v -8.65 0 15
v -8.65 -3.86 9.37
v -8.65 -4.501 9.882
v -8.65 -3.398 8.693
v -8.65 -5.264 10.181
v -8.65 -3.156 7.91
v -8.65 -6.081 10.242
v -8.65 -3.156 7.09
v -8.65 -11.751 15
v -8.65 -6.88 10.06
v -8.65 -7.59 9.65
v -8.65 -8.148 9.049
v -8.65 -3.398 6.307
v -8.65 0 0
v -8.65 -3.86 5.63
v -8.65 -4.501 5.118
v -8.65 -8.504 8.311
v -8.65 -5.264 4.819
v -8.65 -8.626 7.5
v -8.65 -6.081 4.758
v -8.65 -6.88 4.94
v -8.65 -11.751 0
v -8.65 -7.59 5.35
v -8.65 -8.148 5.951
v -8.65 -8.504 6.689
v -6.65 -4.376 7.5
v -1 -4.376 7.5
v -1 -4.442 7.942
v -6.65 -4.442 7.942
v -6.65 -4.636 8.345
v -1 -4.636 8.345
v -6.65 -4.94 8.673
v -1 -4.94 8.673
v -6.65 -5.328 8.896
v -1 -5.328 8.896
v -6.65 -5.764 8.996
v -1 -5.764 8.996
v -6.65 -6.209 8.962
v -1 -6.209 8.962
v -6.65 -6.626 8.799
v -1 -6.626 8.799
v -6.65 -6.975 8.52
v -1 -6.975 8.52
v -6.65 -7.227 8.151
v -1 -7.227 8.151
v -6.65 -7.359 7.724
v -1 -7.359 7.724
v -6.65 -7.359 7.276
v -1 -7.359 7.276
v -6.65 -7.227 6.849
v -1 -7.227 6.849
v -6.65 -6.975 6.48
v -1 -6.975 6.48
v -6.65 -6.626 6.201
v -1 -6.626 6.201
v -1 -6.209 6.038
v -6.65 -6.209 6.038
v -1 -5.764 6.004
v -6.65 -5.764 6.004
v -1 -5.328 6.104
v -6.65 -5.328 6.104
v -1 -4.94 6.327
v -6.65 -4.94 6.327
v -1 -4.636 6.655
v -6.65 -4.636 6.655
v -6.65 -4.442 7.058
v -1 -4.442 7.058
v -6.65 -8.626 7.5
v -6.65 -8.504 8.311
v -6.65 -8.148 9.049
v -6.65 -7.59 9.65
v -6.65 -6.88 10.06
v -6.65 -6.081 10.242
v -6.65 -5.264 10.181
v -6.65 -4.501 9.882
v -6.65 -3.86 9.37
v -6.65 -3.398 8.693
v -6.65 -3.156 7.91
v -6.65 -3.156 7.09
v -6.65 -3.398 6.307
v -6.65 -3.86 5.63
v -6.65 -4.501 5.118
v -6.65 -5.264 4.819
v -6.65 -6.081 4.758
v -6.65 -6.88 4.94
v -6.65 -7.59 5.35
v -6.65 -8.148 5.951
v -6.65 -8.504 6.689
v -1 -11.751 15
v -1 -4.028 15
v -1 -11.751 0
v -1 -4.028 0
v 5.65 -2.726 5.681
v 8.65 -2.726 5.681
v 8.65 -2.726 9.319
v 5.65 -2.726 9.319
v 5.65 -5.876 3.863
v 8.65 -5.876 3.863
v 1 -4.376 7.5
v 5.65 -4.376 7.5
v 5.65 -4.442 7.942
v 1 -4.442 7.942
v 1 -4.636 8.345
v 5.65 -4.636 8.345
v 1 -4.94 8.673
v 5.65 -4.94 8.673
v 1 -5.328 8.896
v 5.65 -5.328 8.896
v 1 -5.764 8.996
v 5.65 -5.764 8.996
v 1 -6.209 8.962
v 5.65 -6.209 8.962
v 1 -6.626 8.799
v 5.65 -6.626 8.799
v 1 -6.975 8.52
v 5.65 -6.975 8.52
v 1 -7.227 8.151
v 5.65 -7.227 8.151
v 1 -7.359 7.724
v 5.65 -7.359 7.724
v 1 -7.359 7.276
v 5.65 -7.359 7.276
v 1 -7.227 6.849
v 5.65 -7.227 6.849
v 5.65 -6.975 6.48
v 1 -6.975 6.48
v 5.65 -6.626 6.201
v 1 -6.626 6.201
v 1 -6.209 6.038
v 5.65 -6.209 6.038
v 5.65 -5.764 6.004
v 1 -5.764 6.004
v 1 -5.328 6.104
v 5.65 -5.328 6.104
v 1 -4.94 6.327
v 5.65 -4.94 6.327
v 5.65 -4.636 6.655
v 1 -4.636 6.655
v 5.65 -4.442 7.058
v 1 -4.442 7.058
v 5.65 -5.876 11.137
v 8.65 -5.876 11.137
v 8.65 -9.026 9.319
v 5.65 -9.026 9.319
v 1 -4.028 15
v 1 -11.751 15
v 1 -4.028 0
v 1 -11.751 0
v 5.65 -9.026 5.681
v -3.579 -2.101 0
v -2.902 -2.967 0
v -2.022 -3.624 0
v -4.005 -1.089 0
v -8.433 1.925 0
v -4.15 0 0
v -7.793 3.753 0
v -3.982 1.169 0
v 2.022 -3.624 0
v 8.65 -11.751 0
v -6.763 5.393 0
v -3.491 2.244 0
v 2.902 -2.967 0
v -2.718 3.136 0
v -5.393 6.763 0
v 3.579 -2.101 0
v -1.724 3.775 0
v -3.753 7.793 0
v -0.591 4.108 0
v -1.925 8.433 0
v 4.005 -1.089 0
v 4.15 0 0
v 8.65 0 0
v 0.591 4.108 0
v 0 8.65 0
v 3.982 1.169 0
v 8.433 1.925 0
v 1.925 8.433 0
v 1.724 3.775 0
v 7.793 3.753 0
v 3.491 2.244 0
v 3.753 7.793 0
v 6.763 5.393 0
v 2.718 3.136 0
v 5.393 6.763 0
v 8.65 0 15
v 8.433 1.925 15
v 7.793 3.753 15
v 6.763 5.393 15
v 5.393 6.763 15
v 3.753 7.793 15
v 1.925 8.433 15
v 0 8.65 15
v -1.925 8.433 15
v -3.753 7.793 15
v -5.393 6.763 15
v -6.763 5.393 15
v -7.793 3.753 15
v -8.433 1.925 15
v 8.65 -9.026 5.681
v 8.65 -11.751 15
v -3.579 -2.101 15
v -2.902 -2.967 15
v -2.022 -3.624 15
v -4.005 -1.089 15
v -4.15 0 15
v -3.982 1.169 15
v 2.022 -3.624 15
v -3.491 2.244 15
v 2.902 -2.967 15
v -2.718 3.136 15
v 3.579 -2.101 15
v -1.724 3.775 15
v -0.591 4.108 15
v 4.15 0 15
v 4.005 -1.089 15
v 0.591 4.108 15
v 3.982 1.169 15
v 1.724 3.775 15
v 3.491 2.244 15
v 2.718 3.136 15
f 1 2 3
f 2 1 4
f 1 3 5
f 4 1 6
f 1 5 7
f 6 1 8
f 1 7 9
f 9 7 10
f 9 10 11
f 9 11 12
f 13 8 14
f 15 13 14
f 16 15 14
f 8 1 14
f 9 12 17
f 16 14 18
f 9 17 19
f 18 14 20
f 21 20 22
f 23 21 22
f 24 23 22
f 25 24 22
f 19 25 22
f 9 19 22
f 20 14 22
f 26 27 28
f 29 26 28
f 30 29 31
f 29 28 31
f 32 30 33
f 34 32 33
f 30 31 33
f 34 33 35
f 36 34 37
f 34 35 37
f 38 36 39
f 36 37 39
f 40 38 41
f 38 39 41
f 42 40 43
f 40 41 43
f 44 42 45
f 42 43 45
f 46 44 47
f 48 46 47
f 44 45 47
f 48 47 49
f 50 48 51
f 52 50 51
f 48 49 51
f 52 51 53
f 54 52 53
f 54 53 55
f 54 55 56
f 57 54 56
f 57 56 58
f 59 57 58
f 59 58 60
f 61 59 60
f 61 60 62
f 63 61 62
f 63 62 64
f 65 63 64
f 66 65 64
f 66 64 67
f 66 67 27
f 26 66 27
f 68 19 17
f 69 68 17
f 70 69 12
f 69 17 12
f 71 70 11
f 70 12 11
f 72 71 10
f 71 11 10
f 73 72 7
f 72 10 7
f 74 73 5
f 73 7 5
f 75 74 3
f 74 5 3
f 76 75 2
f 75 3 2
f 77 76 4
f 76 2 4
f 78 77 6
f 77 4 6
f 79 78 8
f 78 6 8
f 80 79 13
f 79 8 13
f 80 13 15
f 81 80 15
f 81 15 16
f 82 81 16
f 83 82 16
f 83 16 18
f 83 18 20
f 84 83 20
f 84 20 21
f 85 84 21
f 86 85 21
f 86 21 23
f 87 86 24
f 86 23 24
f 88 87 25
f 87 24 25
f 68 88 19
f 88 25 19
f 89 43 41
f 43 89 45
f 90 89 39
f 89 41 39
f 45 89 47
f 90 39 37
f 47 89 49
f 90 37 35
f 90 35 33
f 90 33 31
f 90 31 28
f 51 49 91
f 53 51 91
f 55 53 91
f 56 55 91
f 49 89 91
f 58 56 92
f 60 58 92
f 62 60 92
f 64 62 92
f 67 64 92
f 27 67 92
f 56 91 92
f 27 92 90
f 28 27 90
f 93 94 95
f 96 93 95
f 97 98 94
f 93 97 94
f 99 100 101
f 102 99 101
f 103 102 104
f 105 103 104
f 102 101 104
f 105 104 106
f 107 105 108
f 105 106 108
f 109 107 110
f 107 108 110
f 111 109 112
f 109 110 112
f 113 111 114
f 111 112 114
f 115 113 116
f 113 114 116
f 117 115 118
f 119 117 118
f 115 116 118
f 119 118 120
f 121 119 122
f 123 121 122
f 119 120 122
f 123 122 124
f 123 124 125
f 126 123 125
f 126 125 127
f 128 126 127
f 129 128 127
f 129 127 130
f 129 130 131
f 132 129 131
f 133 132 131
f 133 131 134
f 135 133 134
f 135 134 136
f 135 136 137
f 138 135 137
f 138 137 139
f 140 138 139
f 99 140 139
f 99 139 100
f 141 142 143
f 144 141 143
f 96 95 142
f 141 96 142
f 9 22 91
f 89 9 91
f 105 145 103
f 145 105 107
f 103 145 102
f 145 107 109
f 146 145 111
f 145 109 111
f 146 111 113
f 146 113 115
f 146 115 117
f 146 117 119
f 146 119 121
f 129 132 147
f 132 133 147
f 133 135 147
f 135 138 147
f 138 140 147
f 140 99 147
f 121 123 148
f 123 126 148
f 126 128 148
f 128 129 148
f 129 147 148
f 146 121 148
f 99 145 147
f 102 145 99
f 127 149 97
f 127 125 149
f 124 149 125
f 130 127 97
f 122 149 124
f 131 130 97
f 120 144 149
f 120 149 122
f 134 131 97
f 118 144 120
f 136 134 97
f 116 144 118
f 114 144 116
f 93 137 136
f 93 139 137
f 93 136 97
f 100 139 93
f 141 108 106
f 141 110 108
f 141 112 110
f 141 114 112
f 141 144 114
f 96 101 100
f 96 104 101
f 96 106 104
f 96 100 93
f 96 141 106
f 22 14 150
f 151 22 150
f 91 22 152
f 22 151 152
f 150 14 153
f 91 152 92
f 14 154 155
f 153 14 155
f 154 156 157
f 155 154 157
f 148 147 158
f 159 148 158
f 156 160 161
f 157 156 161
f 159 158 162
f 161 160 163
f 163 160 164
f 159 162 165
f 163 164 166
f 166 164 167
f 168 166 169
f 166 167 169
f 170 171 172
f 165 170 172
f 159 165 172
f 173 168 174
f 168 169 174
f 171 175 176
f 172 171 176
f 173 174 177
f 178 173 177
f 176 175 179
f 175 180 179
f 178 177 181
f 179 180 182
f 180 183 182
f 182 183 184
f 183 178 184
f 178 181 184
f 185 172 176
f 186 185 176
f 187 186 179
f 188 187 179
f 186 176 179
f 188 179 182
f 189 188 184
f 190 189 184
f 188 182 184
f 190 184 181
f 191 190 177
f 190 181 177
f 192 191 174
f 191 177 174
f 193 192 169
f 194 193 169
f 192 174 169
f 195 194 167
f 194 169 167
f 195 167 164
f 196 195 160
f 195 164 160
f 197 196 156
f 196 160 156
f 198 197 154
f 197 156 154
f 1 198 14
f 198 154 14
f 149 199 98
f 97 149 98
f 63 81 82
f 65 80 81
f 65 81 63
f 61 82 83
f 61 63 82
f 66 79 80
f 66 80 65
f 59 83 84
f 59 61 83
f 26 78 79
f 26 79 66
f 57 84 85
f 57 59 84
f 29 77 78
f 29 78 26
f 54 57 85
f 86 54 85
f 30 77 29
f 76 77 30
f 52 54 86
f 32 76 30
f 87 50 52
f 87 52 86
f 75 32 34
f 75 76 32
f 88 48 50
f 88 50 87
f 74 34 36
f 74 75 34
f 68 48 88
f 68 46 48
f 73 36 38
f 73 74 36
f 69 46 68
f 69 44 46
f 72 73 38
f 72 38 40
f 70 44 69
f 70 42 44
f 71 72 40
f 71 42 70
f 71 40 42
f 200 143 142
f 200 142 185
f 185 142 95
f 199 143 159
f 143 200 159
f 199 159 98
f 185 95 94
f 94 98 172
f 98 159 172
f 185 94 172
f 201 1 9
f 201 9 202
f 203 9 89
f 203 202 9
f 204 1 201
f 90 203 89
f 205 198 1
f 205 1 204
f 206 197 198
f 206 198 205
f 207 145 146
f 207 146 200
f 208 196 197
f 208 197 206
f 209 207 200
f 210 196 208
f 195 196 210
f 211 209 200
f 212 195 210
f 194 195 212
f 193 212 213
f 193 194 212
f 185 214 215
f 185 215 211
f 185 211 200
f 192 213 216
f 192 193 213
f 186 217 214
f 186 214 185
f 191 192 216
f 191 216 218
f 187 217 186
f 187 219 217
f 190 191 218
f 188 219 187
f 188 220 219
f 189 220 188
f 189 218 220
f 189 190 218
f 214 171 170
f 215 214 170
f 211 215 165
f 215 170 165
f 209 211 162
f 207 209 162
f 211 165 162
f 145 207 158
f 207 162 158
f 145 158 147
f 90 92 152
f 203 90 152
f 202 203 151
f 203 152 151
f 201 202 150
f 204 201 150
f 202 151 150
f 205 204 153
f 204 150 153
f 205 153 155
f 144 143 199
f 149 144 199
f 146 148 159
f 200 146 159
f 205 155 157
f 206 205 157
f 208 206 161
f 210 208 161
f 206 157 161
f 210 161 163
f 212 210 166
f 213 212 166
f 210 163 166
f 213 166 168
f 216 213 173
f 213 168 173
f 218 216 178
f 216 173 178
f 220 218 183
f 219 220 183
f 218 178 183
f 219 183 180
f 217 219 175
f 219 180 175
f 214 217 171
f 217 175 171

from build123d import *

# Parameters (mm, degrees)
F1_DEPTH = 15
F2_R     = 1.5
F3_DEPTH = 17.301
F5_DEPTH = 3
F6_R     = 2.75
F7_DEPTH = 2


with BuildPart() as f1:
    # F0 (on Top) → F1 (new body)
    with BuildSketch(Plane.XY):
        with BuildLine():
            Line((-1, -11.7513947189), (-1, -8.592002095))
            ThreePointArc((-1, -8.592002095), (-6.4603598971, -5.7520648466), (-8.65, 0))
            Line((-8.65, 0), (-8.65, -11.7513947189))
            Line((-8.65, -11.7513947189), (-1, -11.7513947189))
        make_face()
        with BuildLine():
            ThreePointArc((8.65, 0), (6.4603598971, -5.7520648466), (1, -8.592002095))
            Line((1, -8.592002095), (1, -11.7513947189))
            Line((1, -11.7513947189), (8.65, -11.7513947189))
            Line((8.65, -11.7513947189), (8.65, 0))
        make_face()
        with BuildLine():
            Line((-8.65, 0), (-4.15, 0))
            ThreePointArc((-4.15, 0), (0, 4.15), (4.15, 0))
            Line((4.15, 0), (8.65, 0))
            ThreePointArc((8.65, 0), (0, 8.65), (-8.65, 0))
        make_face()
        with BuildLine():
            Line((-1, -8.592002095), (-1, -4.0277164746))
            ThreePointArc((-1, -4.0277164746), (-3.2689830223, -2.5566090824), (-4.15, 0))
            Line((-4.15, 0), (-8.65, 0))
            ThreePointArc((-8.65, 0), (-6.4603598971, -5.7520648466), (-1, -8.592002095))
        make_face()
        with BuildLine():
            ThreePointArc((4.15, 0), (3.2689830223, -2.5566090824), (1, -4.0277164746))
            Line((1, -4.0277164746), (1, -8.592002095))
            ThreePointArc((1, -8.592002095), (6.4603598971, -5.7520648466), (8.65, 0))
            Line((8.65, 0), (4.15, 0))
        make_face()
    extrude(amount=F1_DEPTH)

    # F2 (on face) → F3 (cut, through all)
    with BuildSketch(Plane.YZ.offset(8.65)):
        with Locations((-5.8756973594, 7.5)):
            Circle(F2_R)
    extrude(amount=-F3_DEPTH, mode=Mode.SUBTRACT)

    # F4 (on face) → F5 (cut)
    with BuildSketch(Plane.YZ.offset(8.65)):
        Polygon((-2.7256973594, 9.3186533479), (-5.8756973594, 11.1373066959), (-9.0256973594, 9.3186533479), (-9.0256973594, 5.6813466521), (-5.8756973594, 3.8626933041), (-2.7256973594, 5.6813466521), align=None)
    extrude(amount=-F5_DEPTH, mode=Mode.SUBTRACT)

    # F6 (on face) → F7 (cut)
    with BuildSketch(Plane(origin=(-8.65, 0, 0), x_dir=(0, -1, 0), z_dir=(-1, 0, 0))):
        with Locations((5.8756973594, 7.5)):
            Circle(F6_R)
    extrude(amount=-F7_DEPTH, mode=Mode.SUBTRACT)


solid = f1.part
